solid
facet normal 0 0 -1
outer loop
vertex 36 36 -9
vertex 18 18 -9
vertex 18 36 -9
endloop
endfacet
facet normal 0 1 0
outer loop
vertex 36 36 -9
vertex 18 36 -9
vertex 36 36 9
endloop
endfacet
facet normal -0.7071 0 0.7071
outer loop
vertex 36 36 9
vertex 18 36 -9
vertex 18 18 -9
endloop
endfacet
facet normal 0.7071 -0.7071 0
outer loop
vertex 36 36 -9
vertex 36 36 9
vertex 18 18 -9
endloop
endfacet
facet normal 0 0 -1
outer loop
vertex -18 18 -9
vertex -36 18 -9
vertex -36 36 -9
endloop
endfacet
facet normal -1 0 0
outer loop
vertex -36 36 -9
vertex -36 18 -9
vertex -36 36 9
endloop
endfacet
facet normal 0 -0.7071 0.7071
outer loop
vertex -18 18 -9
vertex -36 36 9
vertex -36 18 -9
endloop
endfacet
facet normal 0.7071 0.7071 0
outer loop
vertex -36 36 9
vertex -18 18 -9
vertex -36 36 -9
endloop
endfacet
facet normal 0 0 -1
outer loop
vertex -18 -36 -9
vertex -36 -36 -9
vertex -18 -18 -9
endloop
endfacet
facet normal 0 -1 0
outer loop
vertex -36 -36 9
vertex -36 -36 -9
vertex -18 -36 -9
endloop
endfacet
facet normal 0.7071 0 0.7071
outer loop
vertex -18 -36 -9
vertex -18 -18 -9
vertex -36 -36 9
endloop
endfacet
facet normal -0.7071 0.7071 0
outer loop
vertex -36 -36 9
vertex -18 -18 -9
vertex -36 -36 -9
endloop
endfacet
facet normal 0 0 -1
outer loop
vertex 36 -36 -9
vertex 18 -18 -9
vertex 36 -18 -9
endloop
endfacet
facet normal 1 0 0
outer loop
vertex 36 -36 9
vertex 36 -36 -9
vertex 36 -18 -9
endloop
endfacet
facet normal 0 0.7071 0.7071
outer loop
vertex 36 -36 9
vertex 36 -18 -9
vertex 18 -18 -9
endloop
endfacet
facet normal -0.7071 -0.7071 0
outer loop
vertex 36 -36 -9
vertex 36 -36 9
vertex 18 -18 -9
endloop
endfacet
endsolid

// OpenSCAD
// file: def.scad
total_size = 72;
block_size_2 = total_size / 2 - 0.1;
block_size_4 = total_size / 4;
block_size_6 = total_size / 6;

inf = 1000;

round_radius = 1;
sticker_margin = 2.5;
sticker_round_radius = 0.75;

module _block(size) {
    minkowski() {
        cube([size - round_radius * 2, size - round_radius * 2, size - round_radius * 2], center = true);
        sphere(r = round_radius, $fn = 24);
    }
}

module _selector_0(size) {
    cube([size - 0.2, size - 0.2, size - 0.2], center = true);
}

module _sticker(size) {
    minkowski() {
        cube([size - sticker_margin * 2, size - sticker_margin * 2, 0.1], center = true);
        cylinder(r = sticker_round_radius, h = 0.1, $fn = 24);
    }
}

module _selector_corner_cw(size) {
    difference() {
        cube([size, size, size], center = true);
        rotate([0, -45, 0])
            translate([-inf, -inf, 0])
                cube([inf * 2, inf * 2, inf]);
        rotate([90, 0, 45])
            translate([-inf, -inf, 0])
                cube([inf * 2, inf * 2, inf]);
    }
}

module _selector_corner_ccw(size) {
    difference() {
        cube([size, size, size], center = true);
        rotate([45, 0, 0])
            translate([-inf, -inf, 0])
                cube([inf * 2, inf * 2, inf]);
        rotate([0, -90, -45])
            translate([-inf, -inf, 0])
                cube([inf * 2, inf * 2, inf]);
    }
}

module _selector_edge_cw(size) {
    difference() {
        cube([size, size, size], center = true);
        rotate([90, 0, 45])
            translate([-inf, -inf, 0])
                cube([inf * 2, inf * 2, inf]);
    }
}

module _selector_edge_ccw(size) {
    difference() {
        cube([size, size, size], center = true);
        rotate([0, -90, -45])
            translate([-inf, -inf, 0])
                cube([inf * 2, inf * 2, inf]);
    }
}
// main file
include <def.scad>

for (deg = [0 : 90 : 270])
    rotate([0, 0, deg])
        translate([block_size_4 * 1.5, block_size_4 * 1.5, 0])
            _selector_corner_cw(block_size_4);
